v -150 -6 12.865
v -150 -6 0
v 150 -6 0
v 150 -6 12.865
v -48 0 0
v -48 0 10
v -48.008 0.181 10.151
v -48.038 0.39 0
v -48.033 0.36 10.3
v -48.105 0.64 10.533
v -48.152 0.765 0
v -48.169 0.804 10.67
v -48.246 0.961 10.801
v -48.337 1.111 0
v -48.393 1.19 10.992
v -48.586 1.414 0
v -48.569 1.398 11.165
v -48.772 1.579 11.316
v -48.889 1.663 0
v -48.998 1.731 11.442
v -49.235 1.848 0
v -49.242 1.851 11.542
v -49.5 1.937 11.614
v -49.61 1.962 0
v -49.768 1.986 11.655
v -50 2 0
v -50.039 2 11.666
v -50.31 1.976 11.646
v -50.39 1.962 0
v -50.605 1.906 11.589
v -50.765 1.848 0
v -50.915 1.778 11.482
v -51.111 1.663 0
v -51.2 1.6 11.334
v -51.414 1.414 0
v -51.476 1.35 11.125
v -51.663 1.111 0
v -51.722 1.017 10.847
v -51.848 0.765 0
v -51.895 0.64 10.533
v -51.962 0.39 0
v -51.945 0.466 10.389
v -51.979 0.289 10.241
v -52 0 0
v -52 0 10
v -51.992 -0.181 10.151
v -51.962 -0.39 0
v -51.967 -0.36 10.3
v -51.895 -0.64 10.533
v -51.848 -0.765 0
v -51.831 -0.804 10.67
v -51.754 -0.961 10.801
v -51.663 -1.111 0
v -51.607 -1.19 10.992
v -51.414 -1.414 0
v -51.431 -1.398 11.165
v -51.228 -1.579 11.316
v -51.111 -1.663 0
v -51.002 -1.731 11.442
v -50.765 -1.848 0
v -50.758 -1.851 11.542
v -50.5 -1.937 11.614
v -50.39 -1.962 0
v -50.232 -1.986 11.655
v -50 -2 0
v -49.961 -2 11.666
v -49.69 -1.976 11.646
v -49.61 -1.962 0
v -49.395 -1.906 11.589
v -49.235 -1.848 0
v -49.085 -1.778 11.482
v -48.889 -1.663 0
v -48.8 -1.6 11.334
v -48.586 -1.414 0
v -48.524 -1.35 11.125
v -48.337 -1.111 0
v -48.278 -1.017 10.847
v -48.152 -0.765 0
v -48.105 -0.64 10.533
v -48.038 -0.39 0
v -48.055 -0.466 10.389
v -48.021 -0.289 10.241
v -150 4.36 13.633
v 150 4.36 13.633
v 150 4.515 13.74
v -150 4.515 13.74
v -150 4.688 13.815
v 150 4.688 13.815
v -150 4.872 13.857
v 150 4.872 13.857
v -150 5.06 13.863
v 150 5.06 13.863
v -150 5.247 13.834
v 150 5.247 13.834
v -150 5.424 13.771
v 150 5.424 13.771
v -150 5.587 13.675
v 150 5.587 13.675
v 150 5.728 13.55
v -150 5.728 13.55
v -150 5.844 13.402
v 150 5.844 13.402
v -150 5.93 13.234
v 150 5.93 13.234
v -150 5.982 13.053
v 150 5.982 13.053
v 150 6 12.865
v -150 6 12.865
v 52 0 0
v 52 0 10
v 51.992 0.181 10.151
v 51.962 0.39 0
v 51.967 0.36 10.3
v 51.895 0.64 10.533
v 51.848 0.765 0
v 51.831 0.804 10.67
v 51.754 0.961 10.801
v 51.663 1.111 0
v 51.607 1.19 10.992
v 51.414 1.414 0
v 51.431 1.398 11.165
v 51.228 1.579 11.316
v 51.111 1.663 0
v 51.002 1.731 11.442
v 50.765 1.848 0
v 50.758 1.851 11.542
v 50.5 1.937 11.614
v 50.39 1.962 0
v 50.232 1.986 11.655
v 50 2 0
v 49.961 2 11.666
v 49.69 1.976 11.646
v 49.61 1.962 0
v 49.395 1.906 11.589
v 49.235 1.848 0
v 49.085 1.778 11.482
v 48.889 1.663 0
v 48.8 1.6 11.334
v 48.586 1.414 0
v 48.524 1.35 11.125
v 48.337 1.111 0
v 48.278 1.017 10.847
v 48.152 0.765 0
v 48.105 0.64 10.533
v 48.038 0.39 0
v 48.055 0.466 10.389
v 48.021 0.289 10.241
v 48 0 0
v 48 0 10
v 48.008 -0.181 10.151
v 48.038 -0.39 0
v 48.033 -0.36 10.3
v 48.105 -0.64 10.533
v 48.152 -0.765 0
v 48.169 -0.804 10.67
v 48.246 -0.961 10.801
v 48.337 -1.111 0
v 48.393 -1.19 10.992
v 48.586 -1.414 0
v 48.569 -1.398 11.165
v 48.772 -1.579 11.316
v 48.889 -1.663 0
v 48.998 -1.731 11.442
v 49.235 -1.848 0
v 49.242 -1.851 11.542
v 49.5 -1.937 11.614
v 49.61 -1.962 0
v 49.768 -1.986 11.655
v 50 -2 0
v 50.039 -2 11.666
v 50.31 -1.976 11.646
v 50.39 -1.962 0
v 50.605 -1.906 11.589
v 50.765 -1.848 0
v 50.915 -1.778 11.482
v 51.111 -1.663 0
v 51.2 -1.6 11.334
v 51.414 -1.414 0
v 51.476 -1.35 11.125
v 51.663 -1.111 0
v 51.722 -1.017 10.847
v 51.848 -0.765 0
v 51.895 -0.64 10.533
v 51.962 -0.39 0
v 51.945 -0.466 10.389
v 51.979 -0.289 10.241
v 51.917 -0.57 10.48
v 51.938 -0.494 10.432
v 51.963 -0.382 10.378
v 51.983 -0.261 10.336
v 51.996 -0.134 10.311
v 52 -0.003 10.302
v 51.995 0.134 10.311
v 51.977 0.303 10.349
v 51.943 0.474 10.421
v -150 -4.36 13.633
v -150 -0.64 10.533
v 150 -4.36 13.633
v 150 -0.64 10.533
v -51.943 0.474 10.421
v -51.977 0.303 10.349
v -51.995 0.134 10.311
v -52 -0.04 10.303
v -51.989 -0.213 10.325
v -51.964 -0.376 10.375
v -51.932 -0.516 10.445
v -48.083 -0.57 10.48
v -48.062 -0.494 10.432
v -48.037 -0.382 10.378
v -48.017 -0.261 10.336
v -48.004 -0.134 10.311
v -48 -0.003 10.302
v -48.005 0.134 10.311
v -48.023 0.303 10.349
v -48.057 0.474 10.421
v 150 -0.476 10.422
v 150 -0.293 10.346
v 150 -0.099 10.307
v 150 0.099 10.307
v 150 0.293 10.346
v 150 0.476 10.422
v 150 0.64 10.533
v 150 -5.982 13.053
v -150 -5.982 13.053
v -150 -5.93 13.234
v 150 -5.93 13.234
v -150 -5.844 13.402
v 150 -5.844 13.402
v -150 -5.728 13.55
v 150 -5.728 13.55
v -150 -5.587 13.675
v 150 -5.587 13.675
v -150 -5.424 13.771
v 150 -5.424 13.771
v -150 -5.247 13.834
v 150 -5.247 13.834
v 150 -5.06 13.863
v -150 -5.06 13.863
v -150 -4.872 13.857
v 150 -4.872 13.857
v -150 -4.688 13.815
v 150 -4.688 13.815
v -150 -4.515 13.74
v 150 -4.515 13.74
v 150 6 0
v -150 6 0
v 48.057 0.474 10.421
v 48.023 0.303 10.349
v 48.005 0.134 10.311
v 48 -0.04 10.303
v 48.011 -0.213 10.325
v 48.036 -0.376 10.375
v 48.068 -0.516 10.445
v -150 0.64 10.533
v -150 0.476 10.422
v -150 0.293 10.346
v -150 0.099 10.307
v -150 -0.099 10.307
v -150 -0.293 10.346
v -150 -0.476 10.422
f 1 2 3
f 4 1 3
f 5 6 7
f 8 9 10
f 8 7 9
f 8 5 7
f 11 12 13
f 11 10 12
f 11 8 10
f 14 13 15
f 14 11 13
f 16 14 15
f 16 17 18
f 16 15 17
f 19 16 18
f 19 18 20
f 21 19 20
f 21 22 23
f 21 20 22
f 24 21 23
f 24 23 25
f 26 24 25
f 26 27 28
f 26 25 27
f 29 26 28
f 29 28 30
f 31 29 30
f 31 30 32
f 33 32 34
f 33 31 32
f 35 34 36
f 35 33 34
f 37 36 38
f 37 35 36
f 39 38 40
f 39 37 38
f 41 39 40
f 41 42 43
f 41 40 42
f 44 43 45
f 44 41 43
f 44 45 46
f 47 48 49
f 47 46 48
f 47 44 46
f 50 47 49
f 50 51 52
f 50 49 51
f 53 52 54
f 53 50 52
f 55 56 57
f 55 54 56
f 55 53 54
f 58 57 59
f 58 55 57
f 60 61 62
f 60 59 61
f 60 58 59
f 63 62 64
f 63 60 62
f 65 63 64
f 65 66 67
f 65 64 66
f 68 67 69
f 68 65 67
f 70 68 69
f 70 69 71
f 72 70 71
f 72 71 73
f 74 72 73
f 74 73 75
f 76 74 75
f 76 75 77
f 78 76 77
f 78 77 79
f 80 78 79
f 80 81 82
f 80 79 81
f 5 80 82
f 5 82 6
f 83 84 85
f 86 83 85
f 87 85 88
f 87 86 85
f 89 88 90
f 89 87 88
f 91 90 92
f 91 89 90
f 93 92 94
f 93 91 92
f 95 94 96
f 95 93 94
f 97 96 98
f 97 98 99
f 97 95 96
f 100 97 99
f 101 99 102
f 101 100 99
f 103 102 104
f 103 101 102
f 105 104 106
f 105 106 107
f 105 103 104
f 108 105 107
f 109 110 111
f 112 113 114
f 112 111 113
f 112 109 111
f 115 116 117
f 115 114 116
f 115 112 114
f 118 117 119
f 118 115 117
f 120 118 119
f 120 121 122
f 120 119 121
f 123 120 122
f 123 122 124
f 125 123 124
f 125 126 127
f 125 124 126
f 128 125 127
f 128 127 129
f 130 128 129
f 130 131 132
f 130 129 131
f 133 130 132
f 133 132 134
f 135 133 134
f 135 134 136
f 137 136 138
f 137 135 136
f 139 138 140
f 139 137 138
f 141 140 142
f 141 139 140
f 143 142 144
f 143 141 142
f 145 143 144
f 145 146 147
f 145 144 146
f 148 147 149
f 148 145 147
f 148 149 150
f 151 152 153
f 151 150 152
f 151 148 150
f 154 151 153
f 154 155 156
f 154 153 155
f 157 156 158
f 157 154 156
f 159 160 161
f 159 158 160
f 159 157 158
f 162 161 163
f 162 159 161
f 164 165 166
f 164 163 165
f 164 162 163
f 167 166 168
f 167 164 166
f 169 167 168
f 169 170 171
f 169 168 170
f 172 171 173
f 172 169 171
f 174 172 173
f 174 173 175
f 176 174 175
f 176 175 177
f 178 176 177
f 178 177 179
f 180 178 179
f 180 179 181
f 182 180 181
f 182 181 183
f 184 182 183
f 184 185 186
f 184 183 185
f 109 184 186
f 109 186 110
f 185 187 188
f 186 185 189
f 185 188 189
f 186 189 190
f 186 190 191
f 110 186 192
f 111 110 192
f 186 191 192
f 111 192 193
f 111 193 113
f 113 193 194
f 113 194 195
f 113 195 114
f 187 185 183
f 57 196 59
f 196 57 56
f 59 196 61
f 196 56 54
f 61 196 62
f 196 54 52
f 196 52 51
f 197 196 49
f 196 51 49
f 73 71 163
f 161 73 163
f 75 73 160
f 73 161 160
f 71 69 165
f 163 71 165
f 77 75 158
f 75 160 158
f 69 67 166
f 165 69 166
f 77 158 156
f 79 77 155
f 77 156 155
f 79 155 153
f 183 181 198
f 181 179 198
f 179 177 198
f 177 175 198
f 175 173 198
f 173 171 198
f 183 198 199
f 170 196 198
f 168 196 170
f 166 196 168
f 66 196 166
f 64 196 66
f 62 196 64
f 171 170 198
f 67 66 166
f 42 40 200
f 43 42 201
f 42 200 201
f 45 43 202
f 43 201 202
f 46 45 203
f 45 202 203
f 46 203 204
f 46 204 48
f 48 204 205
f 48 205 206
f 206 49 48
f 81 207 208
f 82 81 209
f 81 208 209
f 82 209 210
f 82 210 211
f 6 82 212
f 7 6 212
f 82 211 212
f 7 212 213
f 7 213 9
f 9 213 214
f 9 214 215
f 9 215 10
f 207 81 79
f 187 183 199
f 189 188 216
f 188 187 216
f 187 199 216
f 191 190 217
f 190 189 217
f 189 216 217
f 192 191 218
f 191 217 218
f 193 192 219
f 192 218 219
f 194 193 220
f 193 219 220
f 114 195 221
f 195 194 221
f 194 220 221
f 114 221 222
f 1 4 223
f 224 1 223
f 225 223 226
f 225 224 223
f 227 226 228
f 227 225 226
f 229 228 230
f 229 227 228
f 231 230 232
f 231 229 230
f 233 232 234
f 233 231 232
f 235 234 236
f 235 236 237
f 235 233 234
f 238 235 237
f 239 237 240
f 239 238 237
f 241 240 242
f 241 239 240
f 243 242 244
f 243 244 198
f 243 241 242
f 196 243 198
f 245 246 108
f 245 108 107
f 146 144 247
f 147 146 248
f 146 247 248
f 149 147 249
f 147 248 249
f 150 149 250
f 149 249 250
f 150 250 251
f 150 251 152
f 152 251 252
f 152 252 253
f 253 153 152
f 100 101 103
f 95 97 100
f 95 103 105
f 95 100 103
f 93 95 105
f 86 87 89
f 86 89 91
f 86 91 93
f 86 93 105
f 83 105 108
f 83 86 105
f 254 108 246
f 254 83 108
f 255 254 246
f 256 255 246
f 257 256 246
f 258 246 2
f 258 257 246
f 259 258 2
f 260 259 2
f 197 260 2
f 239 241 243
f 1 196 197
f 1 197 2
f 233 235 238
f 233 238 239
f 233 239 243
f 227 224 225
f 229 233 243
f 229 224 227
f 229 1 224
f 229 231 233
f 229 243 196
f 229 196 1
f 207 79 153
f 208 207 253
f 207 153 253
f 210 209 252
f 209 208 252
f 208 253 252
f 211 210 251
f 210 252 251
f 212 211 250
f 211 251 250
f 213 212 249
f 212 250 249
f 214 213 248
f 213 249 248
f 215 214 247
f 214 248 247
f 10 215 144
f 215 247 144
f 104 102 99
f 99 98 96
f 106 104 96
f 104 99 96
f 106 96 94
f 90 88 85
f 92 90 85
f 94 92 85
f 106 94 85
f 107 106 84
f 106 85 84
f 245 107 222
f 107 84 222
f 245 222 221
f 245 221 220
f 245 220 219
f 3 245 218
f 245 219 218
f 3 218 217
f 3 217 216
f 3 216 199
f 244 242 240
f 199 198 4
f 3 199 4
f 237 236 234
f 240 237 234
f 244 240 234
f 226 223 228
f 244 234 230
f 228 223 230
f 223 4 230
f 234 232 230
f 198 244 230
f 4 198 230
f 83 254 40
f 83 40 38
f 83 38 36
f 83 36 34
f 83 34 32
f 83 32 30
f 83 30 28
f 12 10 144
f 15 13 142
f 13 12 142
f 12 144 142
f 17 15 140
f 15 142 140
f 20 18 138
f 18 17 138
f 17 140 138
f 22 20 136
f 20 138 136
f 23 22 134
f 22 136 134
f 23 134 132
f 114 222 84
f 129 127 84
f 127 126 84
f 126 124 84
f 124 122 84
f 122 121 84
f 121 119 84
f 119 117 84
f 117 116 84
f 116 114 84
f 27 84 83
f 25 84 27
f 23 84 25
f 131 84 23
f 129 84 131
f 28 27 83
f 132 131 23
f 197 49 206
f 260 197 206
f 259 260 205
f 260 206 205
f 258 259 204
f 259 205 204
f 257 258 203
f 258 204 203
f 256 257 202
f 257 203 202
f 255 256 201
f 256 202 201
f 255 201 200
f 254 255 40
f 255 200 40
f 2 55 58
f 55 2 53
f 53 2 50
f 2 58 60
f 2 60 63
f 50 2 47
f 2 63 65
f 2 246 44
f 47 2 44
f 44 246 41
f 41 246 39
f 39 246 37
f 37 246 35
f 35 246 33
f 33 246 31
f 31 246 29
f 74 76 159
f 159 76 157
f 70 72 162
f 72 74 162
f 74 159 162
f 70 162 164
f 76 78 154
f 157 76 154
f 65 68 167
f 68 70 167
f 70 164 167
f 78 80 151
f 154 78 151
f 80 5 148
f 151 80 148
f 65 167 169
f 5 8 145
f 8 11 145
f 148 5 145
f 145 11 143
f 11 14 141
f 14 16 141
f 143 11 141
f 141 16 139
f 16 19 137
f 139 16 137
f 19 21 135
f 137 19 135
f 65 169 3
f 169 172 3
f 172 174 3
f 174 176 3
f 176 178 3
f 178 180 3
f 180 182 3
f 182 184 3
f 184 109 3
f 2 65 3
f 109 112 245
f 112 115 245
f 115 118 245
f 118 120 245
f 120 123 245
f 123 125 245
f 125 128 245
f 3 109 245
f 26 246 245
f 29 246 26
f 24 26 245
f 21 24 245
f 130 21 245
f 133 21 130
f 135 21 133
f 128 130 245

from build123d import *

# Parameters (mm, degrees)
F0_W         = 300
F0_H         = 12
F0_R         = 2
F1_DEPTH     = 15
F3_DEPTH     = 300.001
F4_T4_DEPTH  = 100.0833333333
F4_S5_R      = 2
F4_T6_DEPTH  = 52
F4_T10_DEPTH = 100.1666666667
F4_S11_R     = 2
F4_T12_DEPTH = 52
F4_S13_R     = 2
F4_T14_DEPTH = 52
F4_T18_DEPTH = 100.0833333333
F4_S19_R     = 2
F4_T20_DEPTH = 52
F4_T21_DEPTH = 310.6752080633


# Not quite as in the source:
# - a fillet or chamfer that OpenCascade refuses, or shapes differently, is made with other operations: its cross-section is extruded or revolved along the edge and cut away or added


with BuildPart() as f1:
    # F0 (on Top) → F1 (new body)
    with BuildSketch(Plane.XY):
        Rectangle(F0_W, F0_H)
        with Locations((-50, 0)):
            Circle(F0_R, mode=Mode.SUBTRACT)
        with Locations((50, 0)):
            Circle(F0_R, mode=Mode.SUBTRACT)
    extrude(amount=F1_DEPTH)

    # F2 (on face) → F3 (cut, through all)
    with BuildSketch(Plane.YZ.offset(150)):
        Polygon((6, 15), (-6, 15), (0, 10), align=None)
    extrude(amount=-F3_DEPTH, mode=Mode.SUBTRACT)

    # F4: fillet of radius 1 on 5 edges, made by hand


with BuildPart() as f4_tool2:
    # F4_s3 → F4_t4 (new body)
    with BuildSketch(Plane.YZ.offset(150)):
        with BuildLine():
            ThreePointArc((-0.6401843997, 10.5334869997), (0, 10.3017082793), (0.6401843997, 10.5334869997))
            Line((0.6401843997, 10.5334869997), (0, 10))
            Line((0, 10), (-0.6401843997, 10.5334869997))
        make_face()
    extrude(amount=-F4_T4_DEPTH)

    # F4_s5 → F4_t6 (cut, symmetric)
    with BuildSketch(Plane.XY.offset(10.3)):
        with Locations((50, 0)):
            Circle(F4_S5_R)
    extrude(amount=F4_T6_DEPTH, both=True, mode=Mode.SUBTRACT)


with BuildPart() as f1_1:
    add(f1.part)

    # F4_t1: union F4_tool2
    add(f4_tool2.part)


with BuildPart() as f4_tool8:
    # F4_s9 → F4_t10 (new body)
    with BuildSketch(Plane.YZ.offset(50.0833333333)):
        with BuildLine():
            ThreePointArc((-0.6401843997, 10.5334869997), (0, 10.3017082793), (0.6401843997, 10.5334869997))
            Line((0.6401843997, 10.5334869997), (0, 10))
            Line((0, 10), (-0.6401843997, 10.5334869997))
        make_face()
    extrude(amount=-F4_T10_DEPTH)

    # F4_s11 → F4_t12 (cut, symmetric)
    with BuildSketch(Plane.XY.offset(10.3)):
        with Locations((50, 0)):
            Circle(F4_S11_R)
    extrude(amount=F4_T12_DEPTH, both=True, mode=Mode.SUBTRACT)

    # F4_s13 → F4_t14 (cut, symmetric)
    with BuildSketch(Plane.XY.offset(10.3)):
        with Locations((-50, 0)):
            Circle(F4_S13_R)
    extrude(amount=F4_T14_DEPTH, both=True, mode=Mode.SUBTRACT)


with BuildPart() as f1_2:
    add(f1_1.part)

    # F4_t7: union F4_tool8
    add(f4_tool8.part)


with BuildPart() as f4_tool16:
    # F4_s17 → F4_t18 (new body)
    with BuildSketch(Plane.YZ.offset(-49.9166666667)):
        with BuildLine():
            ThreePointArc((-0.6401843997, 10.5334869997), (0, 10.3017082793), (0.6401843997, 10.5334869997))
            Line((0.6401843997, 10.5334869997), (0, 10))
            Line((0, 10), (-0.6401843997, 10.5334869997))
        make_face()
    extrude(amount=-F4_T18_DEPTH)

    # F4_s19 → F4_t20 (cut, symmetric)
    with BuildSketch(Plane.XY.offset(10.3)):
        with Locations((-50, 0)):
            Circle(F4_S19_R)
    extrude(amount=F4_T20_DEPTH, both=True, mode=Mode.SUBTRACT)


with BuildPart() as f1_3:
    add(f1_2.part)

    # F4_t15: union F4_tool16
    add(f4_tool16.part)

    # F4_s22 → F4_t21 (cut)
    with BuildSketch(Plane.YZ.offset(-155.3376040316)):
        with BuildLine():
            ThreePointArc((-6, 12.8649583873), (-5.4241553962, 13.7705478086), (-4.3598156003, 13.6331796669))
            Line((-4.3598156003, 13.6331796669), (-6, 15))
            Line((-6, 15), (-6, 12.8649583873))
        make_face()
        with BuildLine():
            ThreePointArc((4.3598156003, 13.6331796669), (5.4241553962, 13.7705478086), (6, 12.8649583873))
            Line((6, 12.8649583873), (6, 15))
            Line((6, 15), (4.3598156003, 13.6331796669))
        make_face()
    extrude(amount=F4_T21_DEPTH, mode=Mode.SUBTRACT)


solid = f1_3.part
